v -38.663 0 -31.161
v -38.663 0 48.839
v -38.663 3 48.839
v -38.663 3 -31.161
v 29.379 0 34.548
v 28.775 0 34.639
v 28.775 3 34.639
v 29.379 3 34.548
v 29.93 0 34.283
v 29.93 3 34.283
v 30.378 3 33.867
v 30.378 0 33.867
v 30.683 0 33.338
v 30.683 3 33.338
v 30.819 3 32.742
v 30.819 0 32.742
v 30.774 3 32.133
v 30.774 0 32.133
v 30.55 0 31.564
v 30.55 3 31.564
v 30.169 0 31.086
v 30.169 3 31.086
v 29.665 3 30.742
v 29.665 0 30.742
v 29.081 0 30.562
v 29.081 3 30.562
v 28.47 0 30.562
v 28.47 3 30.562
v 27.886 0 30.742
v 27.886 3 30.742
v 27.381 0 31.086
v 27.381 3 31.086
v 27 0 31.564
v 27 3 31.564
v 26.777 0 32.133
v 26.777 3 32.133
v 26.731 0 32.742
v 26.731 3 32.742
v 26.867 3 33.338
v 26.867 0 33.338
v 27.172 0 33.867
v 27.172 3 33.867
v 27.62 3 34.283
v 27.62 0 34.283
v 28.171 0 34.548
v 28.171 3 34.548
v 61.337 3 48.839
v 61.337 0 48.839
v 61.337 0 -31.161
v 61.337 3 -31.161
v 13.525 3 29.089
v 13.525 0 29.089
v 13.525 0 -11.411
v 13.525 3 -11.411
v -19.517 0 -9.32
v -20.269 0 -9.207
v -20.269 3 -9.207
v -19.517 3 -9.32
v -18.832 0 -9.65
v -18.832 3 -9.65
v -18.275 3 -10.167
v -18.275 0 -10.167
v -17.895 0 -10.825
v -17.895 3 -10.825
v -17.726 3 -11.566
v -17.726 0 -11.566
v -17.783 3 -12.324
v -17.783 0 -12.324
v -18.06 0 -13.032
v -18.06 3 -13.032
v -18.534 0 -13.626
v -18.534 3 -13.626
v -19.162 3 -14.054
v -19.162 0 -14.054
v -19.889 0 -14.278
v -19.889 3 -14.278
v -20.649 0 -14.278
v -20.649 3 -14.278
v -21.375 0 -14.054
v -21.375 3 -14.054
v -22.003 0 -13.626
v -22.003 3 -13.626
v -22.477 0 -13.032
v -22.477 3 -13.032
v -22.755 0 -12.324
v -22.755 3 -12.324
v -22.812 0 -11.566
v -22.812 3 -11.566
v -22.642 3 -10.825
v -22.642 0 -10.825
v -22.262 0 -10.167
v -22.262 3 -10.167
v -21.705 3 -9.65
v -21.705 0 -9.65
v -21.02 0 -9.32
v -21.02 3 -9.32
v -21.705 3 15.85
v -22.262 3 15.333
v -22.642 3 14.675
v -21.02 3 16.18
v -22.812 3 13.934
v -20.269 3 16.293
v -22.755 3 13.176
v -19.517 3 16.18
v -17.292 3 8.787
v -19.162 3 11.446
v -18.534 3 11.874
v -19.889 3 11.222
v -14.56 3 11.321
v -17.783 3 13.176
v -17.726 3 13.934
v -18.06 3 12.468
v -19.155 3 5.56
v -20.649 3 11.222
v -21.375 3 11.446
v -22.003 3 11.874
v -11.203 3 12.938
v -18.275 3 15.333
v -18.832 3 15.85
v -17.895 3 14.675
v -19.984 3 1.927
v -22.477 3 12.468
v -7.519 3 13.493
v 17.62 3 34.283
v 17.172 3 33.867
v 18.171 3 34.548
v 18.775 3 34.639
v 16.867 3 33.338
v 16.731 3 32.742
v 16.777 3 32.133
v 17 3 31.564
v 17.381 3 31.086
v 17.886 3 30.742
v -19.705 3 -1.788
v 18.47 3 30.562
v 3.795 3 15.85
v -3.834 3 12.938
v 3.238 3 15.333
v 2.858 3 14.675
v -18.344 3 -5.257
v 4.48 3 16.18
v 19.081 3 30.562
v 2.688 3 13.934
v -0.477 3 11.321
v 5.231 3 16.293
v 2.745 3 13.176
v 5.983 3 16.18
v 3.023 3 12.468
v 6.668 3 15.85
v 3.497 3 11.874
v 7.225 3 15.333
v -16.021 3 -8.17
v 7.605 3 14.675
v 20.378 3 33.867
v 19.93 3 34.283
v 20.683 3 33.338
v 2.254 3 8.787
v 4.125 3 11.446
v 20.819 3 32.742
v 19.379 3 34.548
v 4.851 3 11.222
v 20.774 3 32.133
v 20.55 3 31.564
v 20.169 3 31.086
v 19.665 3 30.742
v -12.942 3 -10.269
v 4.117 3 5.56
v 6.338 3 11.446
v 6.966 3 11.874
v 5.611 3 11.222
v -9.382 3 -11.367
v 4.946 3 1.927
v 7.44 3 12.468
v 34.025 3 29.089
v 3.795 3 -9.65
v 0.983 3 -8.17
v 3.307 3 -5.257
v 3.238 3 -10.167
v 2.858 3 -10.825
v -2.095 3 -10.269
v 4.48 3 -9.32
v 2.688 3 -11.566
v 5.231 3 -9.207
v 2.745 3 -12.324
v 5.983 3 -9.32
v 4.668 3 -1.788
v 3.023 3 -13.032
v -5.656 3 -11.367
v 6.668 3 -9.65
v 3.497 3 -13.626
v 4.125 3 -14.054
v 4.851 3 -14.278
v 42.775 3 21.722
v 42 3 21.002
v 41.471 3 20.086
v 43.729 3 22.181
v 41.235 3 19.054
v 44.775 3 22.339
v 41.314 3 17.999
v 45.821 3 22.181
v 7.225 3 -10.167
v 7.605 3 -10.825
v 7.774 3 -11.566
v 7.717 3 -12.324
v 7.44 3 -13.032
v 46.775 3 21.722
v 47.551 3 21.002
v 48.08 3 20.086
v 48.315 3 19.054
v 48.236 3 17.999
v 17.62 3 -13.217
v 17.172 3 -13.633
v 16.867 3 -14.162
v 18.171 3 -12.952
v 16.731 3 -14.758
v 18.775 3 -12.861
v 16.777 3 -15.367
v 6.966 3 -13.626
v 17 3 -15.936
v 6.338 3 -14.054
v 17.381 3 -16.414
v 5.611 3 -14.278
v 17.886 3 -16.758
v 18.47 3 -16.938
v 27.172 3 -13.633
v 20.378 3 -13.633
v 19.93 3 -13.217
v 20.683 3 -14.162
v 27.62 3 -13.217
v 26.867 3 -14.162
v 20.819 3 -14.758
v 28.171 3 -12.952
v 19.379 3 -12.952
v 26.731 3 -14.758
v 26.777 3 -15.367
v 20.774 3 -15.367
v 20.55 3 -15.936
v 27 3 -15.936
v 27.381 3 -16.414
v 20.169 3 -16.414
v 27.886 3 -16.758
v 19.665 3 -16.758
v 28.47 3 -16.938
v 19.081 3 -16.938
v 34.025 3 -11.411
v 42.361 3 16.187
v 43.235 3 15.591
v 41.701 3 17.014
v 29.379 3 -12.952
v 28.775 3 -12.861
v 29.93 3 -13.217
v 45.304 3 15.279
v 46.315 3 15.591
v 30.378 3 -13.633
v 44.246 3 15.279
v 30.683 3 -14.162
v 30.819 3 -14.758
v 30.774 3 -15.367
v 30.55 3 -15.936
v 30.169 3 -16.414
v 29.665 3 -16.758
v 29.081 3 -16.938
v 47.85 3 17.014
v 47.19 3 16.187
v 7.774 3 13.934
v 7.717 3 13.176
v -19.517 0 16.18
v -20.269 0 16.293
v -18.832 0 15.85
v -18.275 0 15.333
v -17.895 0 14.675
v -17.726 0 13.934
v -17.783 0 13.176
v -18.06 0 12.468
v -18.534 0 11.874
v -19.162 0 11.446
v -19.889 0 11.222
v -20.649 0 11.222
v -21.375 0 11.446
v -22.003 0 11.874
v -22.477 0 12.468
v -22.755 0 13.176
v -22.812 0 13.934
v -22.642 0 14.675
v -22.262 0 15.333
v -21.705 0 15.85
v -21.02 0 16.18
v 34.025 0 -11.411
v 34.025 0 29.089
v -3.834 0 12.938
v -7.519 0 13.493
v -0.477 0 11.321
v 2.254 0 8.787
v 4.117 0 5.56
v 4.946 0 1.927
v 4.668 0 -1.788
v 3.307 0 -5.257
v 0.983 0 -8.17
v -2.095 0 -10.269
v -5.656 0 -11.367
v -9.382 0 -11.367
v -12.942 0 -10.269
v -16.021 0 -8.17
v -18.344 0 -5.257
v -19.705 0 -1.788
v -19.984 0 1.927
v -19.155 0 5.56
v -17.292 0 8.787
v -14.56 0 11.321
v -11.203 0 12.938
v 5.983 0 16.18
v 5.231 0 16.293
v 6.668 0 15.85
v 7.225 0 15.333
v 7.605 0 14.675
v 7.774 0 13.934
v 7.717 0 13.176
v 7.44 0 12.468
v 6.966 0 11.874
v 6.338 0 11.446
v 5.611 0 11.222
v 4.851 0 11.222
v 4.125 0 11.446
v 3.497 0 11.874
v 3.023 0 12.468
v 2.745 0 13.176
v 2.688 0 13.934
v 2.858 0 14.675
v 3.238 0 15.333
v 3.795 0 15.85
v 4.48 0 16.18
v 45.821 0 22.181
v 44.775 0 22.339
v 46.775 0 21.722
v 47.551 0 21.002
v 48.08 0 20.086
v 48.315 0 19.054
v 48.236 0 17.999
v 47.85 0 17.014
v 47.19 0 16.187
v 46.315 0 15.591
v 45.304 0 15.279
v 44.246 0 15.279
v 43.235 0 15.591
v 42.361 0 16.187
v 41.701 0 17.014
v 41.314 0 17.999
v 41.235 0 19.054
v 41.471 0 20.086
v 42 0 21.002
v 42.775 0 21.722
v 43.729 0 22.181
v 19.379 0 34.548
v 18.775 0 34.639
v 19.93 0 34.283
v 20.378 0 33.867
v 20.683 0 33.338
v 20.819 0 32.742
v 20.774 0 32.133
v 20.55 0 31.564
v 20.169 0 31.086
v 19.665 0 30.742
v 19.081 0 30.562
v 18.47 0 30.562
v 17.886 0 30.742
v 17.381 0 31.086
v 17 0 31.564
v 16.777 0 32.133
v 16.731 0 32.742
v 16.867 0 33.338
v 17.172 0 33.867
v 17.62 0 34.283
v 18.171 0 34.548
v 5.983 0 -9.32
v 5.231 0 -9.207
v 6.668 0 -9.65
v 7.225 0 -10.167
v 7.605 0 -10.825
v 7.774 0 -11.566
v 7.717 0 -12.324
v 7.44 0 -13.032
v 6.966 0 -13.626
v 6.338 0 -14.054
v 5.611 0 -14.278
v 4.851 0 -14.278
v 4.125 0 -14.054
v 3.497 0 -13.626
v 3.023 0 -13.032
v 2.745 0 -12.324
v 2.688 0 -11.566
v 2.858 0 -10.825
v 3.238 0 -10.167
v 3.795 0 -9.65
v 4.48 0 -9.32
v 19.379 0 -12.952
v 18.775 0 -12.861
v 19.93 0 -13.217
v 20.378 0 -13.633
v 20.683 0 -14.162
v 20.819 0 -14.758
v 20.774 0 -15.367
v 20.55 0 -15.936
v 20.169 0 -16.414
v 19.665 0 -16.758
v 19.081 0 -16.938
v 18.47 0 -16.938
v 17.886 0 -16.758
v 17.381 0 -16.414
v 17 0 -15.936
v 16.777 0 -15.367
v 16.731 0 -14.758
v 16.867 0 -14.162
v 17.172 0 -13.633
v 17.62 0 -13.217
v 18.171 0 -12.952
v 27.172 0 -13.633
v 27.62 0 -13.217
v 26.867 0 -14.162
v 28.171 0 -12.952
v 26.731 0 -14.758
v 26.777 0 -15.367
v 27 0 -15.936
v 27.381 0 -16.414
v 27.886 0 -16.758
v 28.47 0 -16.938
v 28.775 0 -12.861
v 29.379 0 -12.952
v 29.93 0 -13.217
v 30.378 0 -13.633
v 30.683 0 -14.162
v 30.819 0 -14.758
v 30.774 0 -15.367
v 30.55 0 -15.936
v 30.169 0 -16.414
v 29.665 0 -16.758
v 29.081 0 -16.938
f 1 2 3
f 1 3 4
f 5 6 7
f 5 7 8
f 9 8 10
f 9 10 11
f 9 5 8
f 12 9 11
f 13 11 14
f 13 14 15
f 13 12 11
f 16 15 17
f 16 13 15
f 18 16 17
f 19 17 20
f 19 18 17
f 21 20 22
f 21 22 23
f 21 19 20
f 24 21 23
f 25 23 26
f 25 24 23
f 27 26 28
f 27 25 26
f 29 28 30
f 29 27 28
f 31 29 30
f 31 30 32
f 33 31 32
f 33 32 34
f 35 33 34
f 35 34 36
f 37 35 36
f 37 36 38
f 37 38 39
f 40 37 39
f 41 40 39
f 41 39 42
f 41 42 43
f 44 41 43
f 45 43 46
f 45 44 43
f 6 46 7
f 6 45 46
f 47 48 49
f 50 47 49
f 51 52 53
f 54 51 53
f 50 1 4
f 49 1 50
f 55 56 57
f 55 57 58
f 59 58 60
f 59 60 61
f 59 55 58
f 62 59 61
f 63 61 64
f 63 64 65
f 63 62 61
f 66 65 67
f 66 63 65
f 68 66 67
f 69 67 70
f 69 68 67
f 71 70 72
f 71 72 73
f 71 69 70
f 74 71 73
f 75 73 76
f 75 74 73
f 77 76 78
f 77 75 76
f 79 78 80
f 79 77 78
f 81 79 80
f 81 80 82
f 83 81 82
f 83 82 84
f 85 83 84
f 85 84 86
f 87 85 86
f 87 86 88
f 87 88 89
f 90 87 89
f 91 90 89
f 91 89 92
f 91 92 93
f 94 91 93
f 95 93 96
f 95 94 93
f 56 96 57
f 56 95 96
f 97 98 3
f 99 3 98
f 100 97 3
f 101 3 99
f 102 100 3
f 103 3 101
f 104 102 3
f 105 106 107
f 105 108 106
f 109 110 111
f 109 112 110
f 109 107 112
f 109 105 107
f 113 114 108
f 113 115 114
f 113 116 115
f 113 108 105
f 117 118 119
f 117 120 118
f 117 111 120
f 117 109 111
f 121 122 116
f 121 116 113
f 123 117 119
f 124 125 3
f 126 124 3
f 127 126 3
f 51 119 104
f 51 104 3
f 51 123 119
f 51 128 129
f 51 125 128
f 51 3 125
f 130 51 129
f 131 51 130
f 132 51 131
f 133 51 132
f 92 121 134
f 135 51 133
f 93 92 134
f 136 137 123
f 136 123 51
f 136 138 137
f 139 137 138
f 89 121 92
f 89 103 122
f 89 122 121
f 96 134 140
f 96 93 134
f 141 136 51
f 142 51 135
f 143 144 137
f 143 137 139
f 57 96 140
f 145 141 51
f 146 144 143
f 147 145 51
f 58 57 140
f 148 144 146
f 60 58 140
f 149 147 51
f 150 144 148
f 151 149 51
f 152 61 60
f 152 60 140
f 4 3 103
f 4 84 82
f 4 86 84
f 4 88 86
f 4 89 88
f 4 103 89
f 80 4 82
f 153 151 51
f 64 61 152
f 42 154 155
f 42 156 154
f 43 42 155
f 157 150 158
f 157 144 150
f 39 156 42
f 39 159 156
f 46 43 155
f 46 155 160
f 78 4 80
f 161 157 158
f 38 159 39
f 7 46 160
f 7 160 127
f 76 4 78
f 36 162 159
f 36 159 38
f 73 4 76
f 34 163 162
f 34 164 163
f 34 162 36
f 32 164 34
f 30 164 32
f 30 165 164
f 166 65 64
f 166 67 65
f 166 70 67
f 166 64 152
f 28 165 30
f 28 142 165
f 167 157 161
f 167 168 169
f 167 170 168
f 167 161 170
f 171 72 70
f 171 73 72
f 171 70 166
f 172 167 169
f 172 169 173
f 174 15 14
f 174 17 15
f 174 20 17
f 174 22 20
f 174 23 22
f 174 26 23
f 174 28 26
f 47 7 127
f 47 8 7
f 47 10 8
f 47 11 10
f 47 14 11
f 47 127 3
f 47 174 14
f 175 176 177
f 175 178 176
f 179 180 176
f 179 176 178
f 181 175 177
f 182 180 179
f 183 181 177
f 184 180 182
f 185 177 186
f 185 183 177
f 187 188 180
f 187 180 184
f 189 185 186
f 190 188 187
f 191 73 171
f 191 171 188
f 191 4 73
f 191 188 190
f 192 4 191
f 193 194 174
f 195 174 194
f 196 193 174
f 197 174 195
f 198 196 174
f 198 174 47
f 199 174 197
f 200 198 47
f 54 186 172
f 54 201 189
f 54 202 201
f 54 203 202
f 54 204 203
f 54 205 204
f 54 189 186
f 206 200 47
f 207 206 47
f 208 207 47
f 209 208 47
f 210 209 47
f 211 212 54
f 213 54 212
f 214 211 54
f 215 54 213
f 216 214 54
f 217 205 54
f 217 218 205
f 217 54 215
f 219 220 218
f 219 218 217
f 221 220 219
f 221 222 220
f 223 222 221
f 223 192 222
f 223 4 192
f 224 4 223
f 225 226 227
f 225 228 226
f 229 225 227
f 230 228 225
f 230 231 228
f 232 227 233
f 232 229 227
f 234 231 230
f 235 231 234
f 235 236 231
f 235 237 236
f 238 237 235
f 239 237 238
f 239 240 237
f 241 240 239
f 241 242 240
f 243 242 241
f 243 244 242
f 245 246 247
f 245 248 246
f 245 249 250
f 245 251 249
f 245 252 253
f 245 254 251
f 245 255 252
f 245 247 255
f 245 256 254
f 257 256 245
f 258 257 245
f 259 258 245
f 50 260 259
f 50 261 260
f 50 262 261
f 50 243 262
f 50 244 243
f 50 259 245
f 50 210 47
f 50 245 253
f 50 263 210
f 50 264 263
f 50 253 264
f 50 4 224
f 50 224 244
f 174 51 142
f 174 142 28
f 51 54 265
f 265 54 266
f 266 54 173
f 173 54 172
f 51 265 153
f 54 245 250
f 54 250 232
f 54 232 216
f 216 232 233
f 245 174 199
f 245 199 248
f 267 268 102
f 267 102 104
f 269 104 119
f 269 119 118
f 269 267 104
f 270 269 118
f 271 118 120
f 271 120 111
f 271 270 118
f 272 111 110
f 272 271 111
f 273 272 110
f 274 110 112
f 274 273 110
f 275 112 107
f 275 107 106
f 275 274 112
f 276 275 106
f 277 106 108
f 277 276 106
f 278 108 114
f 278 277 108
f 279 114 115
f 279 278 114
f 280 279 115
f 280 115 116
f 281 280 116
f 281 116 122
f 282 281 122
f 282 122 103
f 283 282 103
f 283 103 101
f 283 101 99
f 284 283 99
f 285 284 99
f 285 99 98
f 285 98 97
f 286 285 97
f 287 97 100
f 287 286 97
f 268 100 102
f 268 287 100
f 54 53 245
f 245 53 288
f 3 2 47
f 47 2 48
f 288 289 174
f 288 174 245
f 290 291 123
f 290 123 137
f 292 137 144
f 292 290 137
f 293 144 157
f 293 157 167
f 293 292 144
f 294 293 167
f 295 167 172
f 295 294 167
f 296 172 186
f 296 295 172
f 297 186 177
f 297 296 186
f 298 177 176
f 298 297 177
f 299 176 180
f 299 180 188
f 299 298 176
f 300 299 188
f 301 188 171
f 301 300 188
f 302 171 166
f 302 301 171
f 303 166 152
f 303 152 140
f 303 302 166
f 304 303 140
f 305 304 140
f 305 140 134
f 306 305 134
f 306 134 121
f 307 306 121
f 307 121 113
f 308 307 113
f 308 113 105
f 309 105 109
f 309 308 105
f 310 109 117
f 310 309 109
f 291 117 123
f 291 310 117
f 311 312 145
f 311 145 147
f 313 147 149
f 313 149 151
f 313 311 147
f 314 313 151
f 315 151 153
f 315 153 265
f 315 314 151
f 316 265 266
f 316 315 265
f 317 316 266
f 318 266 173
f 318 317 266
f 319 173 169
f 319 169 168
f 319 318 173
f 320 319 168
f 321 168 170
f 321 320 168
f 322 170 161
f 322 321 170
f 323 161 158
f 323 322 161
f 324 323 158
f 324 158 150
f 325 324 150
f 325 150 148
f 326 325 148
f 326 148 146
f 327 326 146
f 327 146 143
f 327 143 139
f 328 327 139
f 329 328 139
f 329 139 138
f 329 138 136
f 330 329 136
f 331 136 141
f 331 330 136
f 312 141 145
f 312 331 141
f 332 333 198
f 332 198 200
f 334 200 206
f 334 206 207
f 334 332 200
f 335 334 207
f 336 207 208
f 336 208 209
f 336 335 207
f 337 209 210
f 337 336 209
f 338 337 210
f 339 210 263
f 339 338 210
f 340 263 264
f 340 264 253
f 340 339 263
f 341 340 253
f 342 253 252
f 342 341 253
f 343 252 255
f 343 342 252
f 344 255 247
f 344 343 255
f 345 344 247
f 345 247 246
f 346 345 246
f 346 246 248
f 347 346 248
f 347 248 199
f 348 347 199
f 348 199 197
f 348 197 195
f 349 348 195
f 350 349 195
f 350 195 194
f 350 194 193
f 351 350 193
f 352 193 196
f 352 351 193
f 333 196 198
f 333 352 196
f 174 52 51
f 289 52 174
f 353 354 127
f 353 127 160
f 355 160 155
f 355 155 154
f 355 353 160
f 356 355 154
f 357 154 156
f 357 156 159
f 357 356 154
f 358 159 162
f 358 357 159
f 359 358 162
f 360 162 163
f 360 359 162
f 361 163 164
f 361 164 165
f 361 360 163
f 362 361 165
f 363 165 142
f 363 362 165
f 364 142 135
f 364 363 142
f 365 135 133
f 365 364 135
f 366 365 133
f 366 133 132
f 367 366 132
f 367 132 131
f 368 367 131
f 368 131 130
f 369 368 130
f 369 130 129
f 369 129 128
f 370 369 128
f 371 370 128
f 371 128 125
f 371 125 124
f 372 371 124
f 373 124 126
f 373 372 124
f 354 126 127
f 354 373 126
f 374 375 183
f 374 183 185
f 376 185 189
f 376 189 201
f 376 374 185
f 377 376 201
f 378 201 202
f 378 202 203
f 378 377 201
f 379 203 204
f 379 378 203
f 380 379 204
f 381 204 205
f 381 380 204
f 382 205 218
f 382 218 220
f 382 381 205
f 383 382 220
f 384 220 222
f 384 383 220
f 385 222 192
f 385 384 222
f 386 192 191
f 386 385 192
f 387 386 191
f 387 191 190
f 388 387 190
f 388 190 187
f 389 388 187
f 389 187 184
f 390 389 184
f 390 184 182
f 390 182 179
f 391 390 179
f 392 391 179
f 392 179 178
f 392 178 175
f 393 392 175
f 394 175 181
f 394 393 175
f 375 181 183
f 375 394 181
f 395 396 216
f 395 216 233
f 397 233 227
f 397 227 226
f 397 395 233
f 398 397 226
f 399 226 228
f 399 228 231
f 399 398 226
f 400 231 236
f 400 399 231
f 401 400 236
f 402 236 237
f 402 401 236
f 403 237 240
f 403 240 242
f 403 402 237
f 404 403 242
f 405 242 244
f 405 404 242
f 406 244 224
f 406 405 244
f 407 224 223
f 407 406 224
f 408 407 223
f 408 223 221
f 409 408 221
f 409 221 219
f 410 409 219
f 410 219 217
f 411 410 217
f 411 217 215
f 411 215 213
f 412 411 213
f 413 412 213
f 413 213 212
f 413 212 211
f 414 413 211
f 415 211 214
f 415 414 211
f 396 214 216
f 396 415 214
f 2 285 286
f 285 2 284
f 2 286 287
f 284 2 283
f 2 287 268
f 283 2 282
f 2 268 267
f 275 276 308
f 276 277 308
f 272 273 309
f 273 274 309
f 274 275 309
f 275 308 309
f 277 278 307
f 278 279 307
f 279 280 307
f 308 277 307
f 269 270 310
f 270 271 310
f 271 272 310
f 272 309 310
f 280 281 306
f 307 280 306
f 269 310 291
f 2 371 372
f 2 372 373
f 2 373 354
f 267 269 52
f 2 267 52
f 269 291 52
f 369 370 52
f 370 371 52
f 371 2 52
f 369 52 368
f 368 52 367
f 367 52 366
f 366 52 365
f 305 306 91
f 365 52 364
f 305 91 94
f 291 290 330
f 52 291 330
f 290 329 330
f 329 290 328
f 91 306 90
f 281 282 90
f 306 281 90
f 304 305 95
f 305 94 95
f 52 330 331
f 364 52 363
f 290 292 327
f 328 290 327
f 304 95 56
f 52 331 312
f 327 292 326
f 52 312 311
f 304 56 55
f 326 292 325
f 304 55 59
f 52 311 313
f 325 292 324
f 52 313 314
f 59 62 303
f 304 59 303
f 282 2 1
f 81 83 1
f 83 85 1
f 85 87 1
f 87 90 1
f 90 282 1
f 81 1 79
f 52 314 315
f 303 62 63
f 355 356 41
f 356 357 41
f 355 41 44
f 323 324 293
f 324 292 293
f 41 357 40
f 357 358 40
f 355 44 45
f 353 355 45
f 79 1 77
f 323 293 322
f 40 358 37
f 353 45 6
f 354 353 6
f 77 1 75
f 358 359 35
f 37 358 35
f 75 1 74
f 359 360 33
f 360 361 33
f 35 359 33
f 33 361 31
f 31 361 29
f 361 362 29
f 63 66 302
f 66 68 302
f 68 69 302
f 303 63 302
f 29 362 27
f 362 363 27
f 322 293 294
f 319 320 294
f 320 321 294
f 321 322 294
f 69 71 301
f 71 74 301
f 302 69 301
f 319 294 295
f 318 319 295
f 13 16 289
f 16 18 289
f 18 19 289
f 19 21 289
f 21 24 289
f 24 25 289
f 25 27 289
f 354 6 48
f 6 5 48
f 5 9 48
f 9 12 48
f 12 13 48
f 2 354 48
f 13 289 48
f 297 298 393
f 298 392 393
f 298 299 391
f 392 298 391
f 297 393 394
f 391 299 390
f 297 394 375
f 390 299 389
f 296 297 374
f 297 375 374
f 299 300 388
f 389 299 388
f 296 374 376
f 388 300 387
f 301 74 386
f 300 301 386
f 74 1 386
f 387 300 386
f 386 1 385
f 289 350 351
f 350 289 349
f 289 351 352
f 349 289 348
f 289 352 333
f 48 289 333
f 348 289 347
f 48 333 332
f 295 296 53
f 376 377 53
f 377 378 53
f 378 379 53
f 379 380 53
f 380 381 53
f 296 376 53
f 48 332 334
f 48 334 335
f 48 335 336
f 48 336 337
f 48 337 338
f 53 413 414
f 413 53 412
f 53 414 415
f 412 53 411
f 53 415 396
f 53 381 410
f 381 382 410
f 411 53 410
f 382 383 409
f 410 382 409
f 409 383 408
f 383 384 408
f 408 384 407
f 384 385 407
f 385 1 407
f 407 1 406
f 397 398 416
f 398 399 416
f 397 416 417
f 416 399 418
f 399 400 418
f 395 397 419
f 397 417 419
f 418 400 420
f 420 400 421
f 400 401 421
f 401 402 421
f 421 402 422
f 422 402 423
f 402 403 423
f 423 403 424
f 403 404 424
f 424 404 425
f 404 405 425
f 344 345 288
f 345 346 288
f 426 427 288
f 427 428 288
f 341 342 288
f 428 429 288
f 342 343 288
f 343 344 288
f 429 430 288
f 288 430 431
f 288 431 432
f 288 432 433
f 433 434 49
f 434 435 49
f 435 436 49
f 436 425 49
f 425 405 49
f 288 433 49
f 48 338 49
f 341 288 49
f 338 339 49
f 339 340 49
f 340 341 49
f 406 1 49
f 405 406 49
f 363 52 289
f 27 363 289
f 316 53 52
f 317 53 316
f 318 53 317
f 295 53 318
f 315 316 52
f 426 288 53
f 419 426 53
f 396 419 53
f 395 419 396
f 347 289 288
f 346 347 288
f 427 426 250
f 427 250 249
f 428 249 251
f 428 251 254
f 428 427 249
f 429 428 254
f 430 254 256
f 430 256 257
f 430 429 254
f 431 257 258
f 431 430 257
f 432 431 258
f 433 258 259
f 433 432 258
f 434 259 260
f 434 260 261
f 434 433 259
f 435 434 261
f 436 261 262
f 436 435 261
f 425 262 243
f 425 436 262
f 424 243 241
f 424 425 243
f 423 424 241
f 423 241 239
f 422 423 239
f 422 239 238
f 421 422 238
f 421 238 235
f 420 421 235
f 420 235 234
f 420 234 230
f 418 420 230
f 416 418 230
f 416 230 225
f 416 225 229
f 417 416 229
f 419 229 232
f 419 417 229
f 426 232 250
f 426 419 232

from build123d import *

# Parameters (mm, degrees)
SZKIC1_W                    = 100
SZKIC1_H                    = 80
SZKIC1_R                    = 3.55
SZKIC1_R_2                  = 2.05
SZKIC1_R_3                  = 2.55
SZKIC1_R_4                  = 12.5
SZKIC1_W_2                  = 20.5
SZKIC1_H_2                  = 40.5
DODANIE_WYCI_GNI_CIE1_DEPTH = 3


with BuildPart() as part:
    # Szkic1 → Dodanie-wyciągnięcie1 (new body)
    with BuildSketch(Plane(origin=(0, 0, 0), x_dir=(1, 0, 0), z_dir=(0, 1, 0))):
        with Locations((11.336719097, -8.838965942)):
            Rectangle(SZKIC1_W, SZKIC1_H)
        with Locations(Location((44.775116298, -18.788965942, 0), (0, 0, 270))):
            Circle(SZKIC1_R, mode=Mode.SUBTRACT)
        with Locations(Location((28.775116298, -32.588965942, 0), (0, 0, 270))):
            Circle(SZKIC1_R_2, mode=Mode.SUBTRACT)
        with Locations(Location((18.775116298, -32.588965942, 0), (0, 0, 270))):
            Circle(SZKIC1_R_2, mode=Mode.SUBTRACT)
        with Locations(Location((28.775116298, 14.911034058, 0), (0, 0, 270))):
            Circle(SZKIC1_R_2, mode=Mode.SUBTRACT)
        with Locations(Location((18.775116298, 14.911034058, 0), (0, 0, 270))):
            Circle(SZKIC1_R_2, mode=Mode.SUBTRACT)
        with Locations(Location((-20.268770099, -13.743104788, 0), (0, 0, 270))):
            Circle(SZKIC1_R_3, mode=Mode.SUBTRACT)
        with Locations(Location((5.231229901, -13.743104788, 0), (0, 0, 270))):
            Circle(SZKIC1_R_3, mode=Mode.SUBTRACT)
        with Locations(Location((5.231229901, 11.756895212, 0), (0, 0, 270))):
            Circle(SZKIC1_R_3, mode=Mode.SUBTRACT)
        with Locations(Location((-20.268770099, 11.756895212, 0), (0, 0, 270))):
            Circle(SZKIC1_R_3, mode=Mode.SUBTRACT)
        with Locations(Location((-7.518770099, -0.993104788, 0), (0, 0, 270))):
            Circle(SZKIC1_R_4, mode=Mode.SUBTRACT)
        with Locations((23.775116298, -8.838965942)):
            Rectangle(SZKIC1_W_2, SZKIC1_H_2, mode=Mode.SUBTRACT)
    extrude(amount=DODANIE_WYCI_GNI_CIE1_DEPTH)


solid = part.part
